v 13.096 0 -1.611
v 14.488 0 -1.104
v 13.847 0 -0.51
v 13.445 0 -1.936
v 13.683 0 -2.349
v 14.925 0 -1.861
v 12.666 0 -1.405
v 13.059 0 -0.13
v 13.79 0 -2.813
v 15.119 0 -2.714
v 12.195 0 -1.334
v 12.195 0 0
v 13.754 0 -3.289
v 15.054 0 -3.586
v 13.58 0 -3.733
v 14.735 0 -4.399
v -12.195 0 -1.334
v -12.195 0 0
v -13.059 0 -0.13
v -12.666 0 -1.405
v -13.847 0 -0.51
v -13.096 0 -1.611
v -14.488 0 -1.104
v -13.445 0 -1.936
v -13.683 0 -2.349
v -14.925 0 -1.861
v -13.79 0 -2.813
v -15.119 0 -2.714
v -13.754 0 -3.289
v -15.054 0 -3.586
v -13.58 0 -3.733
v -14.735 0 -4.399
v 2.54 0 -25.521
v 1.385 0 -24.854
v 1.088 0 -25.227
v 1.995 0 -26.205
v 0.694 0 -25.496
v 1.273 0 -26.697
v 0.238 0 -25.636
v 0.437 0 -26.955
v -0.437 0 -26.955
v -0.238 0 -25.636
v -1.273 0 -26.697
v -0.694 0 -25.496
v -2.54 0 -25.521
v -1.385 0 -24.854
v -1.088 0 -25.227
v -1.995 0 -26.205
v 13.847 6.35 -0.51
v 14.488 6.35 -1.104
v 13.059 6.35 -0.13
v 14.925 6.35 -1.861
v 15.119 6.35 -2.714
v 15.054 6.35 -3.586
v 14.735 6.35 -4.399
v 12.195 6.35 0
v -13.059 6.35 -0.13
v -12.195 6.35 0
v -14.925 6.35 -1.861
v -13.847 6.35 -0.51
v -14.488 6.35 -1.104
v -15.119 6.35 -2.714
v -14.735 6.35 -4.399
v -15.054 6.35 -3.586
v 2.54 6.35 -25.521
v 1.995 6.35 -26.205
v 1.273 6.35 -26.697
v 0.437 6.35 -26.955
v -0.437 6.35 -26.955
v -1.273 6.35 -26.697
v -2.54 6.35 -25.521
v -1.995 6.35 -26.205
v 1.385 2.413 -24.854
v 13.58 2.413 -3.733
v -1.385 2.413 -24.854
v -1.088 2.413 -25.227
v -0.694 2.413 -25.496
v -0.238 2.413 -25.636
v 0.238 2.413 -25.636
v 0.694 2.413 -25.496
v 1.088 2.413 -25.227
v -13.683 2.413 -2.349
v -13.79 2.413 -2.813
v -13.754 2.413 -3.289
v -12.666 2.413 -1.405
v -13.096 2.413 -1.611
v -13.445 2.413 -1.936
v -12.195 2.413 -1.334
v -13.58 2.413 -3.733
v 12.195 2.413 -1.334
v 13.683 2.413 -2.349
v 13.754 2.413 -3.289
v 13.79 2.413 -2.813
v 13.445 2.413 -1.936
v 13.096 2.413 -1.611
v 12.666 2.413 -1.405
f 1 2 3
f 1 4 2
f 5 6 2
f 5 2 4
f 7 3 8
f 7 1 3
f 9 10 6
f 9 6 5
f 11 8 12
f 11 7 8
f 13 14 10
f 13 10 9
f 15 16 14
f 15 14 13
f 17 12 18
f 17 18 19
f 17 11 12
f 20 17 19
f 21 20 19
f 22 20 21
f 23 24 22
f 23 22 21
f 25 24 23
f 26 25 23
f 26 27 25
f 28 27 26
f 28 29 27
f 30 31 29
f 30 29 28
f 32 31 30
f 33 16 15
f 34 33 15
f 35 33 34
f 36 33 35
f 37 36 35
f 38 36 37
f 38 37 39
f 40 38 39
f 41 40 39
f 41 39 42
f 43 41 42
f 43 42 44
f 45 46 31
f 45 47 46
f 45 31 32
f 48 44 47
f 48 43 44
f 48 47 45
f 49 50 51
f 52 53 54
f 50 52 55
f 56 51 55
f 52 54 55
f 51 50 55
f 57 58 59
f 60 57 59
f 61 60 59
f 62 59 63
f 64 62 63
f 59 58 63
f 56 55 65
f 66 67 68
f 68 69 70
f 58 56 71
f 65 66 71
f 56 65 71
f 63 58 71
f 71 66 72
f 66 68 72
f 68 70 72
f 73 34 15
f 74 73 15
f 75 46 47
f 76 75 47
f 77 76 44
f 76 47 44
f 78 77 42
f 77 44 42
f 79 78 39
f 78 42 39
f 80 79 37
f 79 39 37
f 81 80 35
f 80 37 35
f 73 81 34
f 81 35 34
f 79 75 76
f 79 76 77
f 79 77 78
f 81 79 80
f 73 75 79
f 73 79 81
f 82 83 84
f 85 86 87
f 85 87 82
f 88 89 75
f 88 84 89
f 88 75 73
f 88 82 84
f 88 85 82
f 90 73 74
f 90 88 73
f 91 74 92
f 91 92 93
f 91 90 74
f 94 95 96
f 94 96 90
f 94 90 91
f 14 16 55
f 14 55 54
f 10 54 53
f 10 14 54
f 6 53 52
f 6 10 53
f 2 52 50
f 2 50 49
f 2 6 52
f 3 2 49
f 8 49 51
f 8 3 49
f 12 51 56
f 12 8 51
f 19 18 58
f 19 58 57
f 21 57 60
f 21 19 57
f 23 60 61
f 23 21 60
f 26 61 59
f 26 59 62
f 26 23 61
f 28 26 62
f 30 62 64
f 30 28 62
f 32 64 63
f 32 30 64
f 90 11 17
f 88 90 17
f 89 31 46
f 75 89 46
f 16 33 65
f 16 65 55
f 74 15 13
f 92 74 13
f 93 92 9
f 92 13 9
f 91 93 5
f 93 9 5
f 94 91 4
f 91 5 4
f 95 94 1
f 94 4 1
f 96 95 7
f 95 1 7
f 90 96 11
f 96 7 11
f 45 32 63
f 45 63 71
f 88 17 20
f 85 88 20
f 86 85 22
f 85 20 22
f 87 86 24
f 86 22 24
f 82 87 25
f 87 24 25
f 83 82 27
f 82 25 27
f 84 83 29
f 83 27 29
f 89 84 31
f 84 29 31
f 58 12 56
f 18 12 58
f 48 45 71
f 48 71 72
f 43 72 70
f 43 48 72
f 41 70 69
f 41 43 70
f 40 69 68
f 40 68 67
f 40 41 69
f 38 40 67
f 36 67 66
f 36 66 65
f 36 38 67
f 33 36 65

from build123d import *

# Parameters (mm, degrees)
BOSS_EXTRUDE1_DEPTH = 6.35
CUT_EXTRUDE1_DEPTH  = 2.413


with BuildPart() as part:
    # Sketch1 → Boss-Extrude1 (new body)
    with BuildSketch(Plane(origin=(0, 0, 0), x_dir=(1, 0, 0), z_dir=(0, 1, 0))):
        with BuildLine():
            Line((2.54, 25.521030316), (14.734573723, 4.399409051))
            ThreePointArc((14.734573723, 4.399409051), (14.734573723, 1.466469684), (12.194573723, 0))
            Line((12.194573723, 0), (-12.194573723, 0))
            ThreePointArc((-12.194573723, 0), (-14.734573723, 1.466469684), (-14.734573723, 4.399409051))
            Line((-14.734573723, 4.399409051), (-2.54, 25.521030316))
            ThreePointArc((-2.54, 25.521030316), (0, 26.9875), (2.54, 25.521030316))
        make_face()
    extrude(amount=BOSS_EXTRUDE1_DEPTH)

    # Sketch2 → Cut-Extrude1 (cut)
    with BuildSketch(Plane.XZ):
        with BuildLine():
            Line((-13.579728847, -3.732659051), (-1.385155124, -24.854280316))
            ThreePointArc((-1.385155124, -24.854280316), (0, -25.654), (1.385155124, -24.854280316))
            Line((1.385155124, -24.854280316), (13.579728847, -3.732659051))
            ThreePointArc((13.579728847, -3.732659051), (13.579728847, -2.133219684), (12.194573723, -1.3335))
            Line((12.194573723, -1.3335), (-12.194573723, -1.3335))
            ThreePointArc((-12.194573723, -1.3335), (-13.579728847, -2.133219684), (-13.579728847, -3.732659051))
        make_face()
    extrude(amount=-CUT_EXTRUDE1_DEPTH, mode=Mode.SUBTRACT)


solid = part.part
